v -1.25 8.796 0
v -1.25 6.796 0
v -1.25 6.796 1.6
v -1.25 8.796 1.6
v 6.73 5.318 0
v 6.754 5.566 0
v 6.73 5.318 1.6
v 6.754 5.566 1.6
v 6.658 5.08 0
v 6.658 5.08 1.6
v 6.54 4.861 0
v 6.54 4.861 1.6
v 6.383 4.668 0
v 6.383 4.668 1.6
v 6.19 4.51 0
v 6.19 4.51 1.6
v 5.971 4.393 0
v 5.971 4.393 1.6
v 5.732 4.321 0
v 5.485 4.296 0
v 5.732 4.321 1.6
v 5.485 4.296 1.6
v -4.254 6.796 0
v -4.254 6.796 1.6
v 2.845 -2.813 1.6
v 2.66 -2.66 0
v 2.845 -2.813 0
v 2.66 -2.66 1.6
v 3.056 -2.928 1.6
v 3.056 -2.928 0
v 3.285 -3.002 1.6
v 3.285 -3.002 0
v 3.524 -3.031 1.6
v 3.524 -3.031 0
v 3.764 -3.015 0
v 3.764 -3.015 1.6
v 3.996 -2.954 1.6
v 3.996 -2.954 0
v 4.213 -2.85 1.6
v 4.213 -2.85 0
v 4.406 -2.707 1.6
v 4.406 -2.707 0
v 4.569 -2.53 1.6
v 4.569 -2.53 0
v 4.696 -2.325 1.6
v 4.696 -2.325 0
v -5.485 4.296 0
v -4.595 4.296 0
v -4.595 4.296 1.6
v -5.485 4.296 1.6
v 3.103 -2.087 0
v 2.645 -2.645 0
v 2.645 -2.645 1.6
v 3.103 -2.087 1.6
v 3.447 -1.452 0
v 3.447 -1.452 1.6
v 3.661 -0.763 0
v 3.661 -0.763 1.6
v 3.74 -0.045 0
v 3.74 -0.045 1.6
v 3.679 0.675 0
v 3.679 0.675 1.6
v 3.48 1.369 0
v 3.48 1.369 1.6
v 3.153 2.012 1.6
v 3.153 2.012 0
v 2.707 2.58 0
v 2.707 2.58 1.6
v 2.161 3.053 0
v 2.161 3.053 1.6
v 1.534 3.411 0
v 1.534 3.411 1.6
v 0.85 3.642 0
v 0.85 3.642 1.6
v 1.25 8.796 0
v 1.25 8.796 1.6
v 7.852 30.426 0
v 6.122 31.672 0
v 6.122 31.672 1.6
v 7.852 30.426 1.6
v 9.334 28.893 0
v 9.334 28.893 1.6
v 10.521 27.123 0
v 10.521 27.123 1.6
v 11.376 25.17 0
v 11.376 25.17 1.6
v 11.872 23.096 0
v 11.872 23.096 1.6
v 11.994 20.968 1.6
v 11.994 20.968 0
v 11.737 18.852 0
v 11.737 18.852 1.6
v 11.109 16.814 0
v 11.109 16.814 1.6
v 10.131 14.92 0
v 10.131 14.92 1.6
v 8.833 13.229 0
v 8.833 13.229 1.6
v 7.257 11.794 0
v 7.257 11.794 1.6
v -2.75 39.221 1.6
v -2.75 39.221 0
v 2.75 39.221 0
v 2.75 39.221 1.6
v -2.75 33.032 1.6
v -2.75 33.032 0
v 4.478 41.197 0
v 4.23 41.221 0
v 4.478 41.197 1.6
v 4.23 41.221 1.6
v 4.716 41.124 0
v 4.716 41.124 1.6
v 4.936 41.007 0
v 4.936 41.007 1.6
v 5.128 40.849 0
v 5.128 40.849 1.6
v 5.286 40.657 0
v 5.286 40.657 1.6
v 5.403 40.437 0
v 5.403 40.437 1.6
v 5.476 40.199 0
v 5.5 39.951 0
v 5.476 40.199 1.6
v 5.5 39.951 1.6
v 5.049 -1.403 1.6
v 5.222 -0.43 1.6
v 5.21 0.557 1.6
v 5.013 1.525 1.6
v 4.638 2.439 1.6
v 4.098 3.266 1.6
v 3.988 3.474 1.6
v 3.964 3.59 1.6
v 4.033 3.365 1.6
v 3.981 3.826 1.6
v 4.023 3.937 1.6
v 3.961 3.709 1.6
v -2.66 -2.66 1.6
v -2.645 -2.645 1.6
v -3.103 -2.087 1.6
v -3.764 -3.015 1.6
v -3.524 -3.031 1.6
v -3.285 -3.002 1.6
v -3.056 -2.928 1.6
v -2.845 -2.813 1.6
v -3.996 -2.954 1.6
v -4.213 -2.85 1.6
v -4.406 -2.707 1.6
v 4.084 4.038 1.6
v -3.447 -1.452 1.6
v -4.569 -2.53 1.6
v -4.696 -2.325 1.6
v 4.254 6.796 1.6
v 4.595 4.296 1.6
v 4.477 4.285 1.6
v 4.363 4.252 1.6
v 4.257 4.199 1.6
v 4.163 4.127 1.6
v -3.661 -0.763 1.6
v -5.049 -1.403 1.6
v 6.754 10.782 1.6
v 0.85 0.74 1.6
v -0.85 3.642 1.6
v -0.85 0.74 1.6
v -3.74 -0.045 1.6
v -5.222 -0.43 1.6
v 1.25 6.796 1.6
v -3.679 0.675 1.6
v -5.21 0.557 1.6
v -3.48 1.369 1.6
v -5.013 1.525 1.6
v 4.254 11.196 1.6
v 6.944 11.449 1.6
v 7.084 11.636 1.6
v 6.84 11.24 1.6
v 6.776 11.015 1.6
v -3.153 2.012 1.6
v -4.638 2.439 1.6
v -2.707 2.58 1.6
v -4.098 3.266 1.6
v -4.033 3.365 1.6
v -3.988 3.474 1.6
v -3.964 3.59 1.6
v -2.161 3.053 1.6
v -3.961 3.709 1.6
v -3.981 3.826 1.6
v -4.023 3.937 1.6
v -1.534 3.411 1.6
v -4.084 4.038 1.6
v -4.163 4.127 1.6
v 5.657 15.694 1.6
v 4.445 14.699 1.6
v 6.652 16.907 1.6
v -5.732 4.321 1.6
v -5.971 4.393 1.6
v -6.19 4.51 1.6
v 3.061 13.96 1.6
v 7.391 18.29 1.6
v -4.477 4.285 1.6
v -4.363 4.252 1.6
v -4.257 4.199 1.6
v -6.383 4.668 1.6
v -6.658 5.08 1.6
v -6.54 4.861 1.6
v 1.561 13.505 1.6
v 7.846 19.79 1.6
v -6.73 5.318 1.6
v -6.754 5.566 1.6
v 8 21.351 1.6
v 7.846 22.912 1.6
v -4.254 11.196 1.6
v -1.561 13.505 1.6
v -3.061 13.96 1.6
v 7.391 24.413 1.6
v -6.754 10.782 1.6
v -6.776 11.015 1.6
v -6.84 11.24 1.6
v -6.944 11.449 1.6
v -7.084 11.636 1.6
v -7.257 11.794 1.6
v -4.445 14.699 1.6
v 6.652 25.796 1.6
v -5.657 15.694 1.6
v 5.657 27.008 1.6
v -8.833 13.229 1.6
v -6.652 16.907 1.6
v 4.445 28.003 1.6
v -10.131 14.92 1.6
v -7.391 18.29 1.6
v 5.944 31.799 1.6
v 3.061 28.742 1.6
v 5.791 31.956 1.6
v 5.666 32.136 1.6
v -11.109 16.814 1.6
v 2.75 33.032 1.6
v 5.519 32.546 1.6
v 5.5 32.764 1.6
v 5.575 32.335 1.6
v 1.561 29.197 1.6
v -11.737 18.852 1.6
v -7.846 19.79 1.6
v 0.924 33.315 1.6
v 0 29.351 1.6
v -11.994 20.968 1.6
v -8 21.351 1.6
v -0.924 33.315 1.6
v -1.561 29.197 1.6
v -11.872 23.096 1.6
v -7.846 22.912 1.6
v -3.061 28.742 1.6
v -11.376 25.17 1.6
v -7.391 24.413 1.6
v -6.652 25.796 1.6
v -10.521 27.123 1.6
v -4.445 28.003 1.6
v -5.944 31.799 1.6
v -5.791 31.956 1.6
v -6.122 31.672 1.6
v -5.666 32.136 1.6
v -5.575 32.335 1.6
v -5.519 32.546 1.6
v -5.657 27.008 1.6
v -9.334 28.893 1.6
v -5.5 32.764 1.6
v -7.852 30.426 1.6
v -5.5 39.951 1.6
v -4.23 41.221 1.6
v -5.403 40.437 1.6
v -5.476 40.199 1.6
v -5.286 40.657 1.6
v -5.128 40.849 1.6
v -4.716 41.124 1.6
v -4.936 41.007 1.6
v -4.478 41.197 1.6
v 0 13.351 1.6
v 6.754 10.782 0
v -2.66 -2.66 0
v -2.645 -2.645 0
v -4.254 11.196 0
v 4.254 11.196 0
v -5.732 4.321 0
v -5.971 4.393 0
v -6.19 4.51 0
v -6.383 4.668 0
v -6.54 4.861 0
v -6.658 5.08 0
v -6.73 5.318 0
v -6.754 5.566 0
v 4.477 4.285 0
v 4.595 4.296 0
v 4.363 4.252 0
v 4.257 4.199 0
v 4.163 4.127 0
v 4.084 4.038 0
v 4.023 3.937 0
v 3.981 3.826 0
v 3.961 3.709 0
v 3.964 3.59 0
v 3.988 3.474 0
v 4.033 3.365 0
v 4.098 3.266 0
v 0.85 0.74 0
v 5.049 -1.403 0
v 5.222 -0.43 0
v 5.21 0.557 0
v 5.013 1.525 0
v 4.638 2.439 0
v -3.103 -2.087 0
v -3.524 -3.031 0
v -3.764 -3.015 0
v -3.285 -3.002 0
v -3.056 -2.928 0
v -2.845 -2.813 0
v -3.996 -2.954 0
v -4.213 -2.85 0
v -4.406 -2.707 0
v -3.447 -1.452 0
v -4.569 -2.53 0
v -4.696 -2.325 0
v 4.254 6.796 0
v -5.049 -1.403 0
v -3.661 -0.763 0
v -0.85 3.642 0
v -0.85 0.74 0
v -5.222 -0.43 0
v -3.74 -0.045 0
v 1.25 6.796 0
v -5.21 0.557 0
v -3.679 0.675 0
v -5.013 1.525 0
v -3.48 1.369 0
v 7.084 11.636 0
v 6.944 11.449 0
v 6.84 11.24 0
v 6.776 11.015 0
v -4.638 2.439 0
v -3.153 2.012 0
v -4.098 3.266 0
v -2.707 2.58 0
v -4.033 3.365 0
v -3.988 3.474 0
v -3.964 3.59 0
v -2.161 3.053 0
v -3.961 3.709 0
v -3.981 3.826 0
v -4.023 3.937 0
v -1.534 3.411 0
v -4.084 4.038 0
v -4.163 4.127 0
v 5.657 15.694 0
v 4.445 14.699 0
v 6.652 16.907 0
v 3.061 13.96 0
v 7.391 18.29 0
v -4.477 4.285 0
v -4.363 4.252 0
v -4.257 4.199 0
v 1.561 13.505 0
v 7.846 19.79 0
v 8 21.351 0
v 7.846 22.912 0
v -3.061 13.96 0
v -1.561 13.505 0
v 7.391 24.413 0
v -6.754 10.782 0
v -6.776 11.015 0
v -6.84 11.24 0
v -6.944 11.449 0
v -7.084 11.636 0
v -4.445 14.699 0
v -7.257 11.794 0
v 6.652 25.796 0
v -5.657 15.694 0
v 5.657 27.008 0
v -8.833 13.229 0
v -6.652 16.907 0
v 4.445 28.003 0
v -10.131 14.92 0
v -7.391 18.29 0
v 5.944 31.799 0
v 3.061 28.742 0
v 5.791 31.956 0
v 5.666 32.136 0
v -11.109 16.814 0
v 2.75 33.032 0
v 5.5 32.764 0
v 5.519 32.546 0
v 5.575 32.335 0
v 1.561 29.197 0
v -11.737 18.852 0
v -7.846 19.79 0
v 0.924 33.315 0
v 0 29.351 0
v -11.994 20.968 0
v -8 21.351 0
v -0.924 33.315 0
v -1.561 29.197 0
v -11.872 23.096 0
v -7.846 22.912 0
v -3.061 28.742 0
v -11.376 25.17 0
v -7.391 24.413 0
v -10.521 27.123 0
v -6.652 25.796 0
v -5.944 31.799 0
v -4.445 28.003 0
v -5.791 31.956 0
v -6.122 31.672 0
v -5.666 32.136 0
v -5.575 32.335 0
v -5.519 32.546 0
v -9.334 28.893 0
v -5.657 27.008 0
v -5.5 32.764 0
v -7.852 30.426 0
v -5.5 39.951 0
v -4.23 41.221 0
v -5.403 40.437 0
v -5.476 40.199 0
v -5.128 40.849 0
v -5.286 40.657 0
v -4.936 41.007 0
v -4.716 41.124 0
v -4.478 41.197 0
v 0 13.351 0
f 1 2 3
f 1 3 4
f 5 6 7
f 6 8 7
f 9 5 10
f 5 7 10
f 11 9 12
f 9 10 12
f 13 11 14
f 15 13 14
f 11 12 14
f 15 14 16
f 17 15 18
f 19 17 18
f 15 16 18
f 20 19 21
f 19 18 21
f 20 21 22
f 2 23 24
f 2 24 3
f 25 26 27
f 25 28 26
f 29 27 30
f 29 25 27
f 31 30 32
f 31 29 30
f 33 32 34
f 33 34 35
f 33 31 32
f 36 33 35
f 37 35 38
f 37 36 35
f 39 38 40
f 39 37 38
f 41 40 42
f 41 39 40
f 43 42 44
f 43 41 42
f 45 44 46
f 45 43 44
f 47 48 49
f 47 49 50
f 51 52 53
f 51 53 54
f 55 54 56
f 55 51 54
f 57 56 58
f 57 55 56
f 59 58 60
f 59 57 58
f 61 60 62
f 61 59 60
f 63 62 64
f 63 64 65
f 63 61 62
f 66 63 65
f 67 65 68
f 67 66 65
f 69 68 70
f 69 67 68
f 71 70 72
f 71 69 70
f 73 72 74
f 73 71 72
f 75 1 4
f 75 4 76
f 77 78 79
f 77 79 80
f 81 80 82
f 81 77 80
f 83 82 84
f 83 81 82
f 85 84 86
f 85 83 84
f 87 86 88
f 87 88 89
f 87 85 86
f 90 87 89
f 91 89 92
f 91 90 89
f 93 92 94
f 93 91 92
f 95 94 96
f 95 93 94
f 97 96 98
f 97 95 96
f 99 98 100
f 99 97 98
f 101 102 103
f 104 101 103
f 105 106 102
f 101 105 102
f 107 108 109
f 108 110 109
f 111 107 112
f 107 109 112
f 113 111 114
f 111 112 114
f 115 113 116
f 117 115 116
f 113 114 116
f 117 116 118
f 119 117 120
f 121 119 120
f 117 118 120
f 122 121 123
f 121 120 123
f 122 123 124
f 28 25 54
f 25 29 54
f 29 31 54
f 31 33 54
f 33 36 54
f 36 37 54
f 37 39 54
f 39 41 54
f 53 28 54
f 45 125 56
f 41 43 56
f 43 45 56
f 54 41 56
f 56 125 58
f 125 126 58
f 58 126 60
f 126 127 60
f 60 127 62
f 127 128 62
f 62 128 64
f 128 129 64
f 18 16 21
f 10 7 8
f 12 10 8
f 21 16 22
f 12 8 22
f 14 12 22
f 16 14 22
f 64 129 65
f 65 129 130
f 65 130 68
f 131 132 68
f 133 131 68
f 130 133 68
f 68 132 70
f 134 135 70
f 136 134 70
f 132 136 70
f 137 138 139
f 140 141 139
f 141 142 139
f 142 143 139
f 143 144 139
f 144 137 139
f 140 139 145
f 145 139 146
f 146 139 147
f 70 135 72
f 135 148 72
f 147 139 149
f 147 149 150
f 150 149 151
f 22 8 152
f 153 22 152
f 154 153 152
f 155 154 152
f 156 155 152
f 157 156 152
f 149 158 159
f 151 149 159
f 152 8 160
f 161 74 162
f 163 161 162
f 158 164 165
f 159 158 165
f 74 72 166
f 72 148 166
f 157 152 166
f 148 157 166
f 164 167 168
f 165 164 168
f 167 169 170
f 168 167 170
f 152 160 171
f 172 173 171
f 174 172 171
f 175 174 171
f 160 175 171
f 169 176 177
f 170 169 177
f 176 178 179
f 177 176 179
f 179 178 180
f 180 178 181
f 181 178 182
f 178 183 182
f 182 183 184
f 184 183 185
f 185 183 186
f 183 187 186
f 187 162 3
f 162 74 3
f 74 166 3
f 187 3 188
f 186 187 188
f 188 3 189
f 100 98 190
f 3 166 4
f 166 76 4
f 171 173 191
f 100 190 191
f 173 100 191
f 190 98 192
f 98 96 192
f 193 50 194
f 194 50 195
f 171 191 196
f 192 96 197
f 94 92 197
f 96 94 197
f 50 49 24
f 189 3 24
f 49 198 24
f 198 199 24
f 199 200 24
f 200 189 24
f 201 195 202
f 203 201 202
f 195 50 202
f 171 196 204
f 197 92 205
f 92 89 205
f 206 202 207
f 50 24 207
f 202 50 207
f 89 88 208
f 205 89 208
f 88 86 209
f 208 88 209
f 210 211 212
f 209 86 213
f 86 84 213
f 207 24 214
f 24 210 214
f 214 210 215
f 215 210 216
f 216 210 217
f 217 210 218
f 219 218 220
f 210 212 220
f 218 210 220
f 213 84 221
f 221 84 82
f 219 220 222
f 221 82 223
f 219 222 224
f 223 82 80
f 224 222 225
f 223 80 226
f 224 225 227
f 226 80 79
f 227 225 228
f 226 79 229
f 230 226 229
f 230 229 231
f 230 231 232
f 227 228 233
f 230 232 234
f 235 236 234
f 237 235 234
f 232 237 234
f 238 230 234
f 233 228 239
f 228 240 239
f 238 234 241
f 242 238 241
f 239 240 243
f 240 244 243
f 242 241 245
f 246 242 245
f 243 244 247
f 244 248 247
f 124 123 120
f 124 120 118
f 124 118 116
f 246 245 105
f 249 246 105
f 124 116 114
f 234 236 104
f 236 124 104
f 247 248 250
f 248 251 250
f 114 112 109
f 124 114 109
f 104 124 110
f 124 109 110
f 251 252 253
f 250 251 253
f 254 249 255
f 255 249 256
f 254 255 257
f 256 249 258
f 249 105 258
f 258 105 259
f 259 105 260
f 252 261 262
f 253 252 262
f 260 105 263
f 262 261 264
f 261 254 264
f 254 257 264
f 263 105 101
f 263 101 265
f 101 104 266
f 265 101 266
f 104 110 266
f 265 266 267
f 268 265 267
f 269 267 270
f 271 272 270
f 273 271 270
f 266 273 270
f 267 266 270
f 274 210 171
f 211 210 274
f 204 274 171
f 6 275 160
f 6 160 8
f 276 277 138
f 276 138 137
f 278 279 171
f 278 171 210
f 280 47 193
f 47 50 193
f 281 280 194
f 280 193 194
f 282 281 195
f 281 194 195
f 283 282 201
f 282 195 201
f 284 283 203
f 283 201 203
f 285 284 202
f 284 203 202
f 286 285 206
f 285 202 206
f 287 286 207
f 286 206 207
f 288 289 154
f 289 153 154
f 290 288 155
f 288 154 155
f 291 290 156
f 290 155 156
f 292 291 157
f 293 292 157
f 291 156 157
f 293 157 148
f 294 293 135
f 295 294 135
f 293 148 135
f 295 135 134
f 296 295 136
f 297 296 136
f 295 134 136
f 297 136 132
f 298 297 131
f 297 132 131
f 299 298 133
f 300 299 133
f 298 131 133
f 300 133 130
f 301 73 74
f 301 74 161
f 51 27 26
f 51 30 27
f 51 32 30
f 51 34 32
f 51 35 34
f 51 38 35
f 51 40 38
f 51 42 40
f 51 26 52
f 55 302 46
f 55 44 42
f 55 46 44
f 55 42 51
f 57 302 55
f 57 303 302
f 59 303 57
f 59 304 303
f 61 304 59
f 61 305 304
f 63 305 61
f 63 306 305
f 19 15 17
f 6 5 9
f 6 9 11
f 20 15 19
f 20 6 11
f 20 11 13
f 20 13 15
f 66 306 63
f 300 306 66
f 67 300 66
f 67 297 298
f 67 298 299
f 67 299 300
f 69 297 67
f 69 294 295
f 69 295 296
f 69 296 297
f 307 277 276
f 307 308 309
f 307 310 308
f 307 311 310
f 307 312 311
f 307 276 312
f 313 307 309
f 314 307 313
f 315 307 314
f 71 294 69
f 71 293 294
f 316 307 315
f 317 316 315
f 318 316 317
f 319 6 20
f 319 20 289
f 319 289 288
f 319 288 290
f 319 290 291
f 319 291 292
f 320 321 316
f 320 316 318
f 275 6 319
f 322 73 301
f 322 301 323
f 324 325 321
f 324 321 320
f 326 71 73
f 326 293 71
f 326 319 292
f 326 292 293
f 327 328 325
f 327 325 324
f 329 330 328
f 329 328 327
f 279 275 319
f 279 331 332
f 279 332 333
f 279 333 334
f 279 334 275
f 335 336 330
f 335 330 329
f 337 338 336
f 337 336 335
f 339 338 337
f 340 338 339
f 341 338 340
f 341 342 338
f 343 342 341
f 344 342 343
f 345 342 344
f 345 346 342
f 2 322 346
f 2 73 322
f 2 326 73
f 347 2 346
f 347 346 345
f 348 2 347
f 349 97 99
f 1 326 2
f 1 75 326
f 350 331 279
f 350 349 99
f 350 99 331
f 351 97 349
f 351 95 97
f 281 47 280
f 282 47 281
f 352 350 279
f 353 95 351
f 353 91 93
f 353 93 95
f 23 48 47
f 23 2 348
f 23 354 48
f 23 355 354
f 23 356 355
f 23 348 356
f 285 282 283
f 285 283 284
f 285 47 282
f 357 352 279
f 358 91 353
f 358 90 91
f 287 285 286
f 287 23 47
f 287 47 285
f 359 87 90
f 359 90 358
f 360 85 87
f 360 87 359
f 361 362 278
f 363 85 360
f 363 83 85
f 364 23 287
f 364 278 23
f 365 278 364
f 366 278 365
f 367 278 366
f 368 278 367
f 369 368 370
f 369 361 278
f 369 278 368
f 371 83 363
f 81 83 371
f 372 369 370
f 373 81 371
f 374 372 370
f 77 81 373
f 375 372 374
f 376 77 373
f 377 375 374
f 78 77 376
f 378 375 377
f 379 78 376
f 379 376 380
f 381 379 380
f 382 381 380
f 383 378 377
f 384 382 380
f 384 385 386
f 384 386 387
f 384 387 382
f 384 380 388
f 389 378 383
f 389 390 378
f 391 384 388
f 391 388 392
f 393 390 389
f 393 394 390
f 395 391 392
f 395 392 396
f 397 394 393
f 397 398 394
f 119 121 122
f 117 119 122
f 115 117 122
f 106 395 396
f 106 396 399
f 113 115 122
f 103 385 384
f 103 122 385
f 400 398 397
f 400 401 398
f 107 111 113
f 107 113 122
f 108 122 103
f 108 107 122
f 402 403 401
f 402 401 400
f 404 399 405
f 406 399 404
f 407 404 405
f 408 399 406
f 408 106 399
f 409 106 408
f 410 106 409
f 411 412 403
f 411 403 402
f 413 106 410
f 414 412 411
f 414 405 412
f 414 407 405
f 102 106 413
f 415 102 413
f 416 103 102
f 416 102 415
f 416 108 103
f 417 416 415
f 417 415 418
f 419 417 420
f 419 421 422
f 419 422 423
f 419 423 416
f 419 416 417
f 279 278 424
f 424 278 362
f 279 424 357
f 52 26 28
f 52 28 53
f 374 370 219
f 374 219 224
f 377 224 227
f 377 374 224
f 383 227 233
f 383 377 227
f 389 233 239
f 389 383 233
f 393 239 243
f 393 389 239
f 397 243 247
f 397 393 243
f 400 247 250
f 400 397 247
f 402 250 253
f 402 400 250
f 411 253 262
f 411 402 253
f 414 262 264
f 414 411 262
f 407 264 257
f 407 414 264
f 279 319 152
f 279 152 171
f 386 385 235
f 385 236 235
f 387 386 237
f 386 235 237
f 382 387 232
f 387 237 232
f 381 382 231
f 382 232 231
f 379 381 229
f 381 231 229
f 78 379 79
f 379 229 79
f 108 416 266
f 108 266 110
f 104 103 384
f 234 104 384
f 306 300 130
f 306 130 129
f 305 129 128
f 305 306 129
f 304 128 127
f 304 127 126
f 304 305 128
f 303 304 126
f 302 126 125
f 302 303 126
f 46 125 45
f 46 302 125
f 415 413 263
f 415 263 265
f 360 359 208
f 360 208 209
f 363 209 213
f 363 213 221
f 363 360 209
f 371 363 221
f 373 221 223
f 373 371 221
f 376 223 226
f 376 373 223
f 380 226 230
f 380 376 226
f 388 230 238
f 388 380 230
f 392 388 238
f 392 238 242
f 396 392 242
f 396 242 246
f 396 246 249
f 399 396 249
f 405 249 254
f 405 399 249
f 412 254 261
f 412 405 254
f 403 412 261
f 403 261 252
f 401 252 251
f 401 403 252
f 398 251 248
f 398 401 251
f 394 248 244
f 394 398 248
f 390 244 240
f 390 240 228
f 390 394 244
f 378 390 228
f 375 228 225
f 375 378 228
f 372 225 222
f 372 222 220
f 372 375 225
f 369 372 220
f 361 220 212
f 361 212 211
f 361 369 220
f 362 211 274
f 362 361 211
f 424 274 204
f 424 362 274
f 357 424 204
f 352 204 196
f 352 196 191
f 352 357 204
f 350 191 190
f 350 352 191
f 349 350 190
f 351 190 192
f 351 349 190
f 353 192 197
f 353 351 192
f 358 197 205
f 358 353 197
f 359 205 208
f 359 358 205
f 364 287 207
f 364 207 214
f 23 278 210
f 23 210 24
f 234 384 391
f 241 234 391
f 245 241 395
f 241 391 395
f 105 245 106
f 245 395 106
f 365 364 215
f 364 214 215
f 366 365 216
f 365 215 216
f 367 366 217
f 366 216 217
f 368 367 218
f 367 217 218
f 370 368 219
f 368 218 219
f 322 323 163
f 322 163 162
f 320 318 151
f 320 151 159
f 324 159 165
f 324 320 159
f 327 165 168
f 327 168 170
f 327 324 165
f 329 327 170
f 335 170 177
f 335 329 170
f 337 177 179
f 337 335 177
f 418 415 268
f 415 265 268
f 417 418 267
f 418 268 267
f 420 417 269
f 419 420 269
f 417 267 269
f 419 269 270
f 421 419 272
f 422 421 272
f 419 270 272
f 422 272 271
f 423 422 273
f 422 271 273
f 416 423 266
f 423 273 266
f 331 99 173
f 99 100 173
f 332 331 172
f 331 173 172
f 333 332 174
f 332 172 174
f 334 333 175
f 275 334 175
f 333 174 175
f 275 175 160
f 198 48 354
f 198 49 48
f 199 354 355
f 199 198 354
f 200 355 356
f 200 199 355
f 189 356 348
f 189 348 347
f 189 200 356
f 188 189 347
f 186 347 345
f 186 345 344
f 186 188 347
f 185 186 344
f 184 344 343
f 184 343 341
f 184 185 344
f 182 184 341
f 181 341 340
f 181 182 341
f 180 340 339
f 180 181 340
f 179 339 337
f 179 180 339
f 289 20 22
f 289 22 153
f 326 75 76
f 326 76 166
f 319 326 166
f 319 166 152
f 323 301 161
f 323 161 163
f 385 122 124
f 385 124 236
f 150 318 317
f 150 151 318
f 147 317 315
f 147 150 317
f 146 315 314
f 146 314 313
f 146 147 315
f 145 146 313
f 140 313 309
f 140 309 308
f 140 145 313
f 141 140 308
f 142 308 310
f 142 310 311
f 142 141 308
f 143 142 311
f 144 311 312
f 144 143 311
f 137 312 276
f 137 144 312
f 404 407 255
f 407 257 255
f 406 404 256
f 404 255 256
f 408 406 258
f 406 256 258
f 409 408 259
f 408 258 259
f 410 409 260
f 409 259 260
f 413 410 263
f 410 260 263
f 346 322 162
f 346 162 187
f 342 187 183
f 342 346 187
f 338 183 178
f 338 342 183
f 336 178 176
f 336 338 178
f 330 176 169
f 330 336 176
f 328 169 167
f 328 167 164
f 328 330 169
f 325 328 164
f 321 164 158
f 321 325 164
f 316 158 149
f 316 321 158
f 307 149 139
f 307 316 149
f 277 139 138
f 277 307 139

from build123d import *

# Parameters (mm, degrees)
SKETCH2_R           = 8
BOSS_EXTRUDE1_DEPTH = 1.6
FILLET1_R           = 0.635
FILLET2_R           = 1.27


with BuildPart() as part:
    # Sketch2 → Boss-Extrude1 (new body)
    with BuildSketch(Plane.XY):
        with BuildLine():
            Line((-5.5, 32.016485365), (-5.5, 41.221120861))
            Line((-5.5, 41.221120861), (5.5, 41.221120861))
            Line((5.5, 41.221120861), (5.5, 32.016485365))
            ThreePointArc((5.5, 32.016485365), (11.977775563, 22.081115767), (6.7545, 11.43261645))
            Line((6.7545, 11.43261645), (6.7545, 4.296230906))
            Line((6.7545, 4.296230906), (3, 4.296230906))
            ThreePointArc((3, 4.296230906), (5.219764516, 0.460063475), (3.705239533, -3.705239533))
            Line((3.705239533, -3.705239533), (2.644579362, -2.644579362))
            ThreePointArc((2.644579362, -2.644579362), (3.596344694, 1.026598676), (0.85, 3.642128499))
            Line((0.85, 3.642128499), (0.85, 0.74))
            Line((0.85, 0.74), (-0.85, 0.74))
            Line((-0.85, 0.74), (-0.85, 3.642128499))
            ThreePointArc((-0.85, 3.642128499), (-3.596344694, 1.026598676), (-2.644579362, -2.644579362))
            Line((-2.644579362, -2.644579362), (-3.705239533, -3.705239533))
            ThreePointArc((-3.705239533, -3.705239533), (-5.219764516, 0.460063475), (-3, 4.296230906))
            Line((-3, 4.296230906), (-6.7545, 4.296230906))
            Line((-6.7545, 4.296230906), (-6.7545, 11.43261645))
            ThreePointArc((-6.7545, 11.43261645), (-11.977775563, 22.081115767), (-5.5, 32.016485365))
        make_face()
        with Locations((0, 21.351120861)):
            Circle(SKETCH2_R, mode=Mode.SUBTRACT)
        with BuildLine():
            Line((-2.75, 39.221120861), (2.75, 39.221120861))
            Line((2.75, 39.221120861), (2.75, 33.031767248))
            ThreePointArc((2.75, 33.031767248), (0, 33.351120861), (-2.75, 33.031767248))
            Line((-2.75, 33.031767248), (-2.75, 39.221120861))
        make_face(mode=Mode.SUBTRACT)
        Polygon((-1.25, 6.796230906), (-1.25, 8.796230906), (1.25, 8.796230906), (1.25, 6.796230906), (4.2545, 6.796230906), (4.2545, 11.196230906), (-4.2545, 11.196230906), (-4.2545, 6.796230906), align=None, mode=Mode.SUBTRACT)
    extrude(amount=BOSS_EXTRUDE1_DEPTH)

    # Fillet1
    fillet1_edges = [part.edges().sort_by_distance(p)[0] for p in [
        (-3, 4.296230906, 0.8),
        (3, 4.296230906, 0.8),
    ]]
    fillet(fillet1_edges, radius=FILLET1_R)

    # Fillet2
    fillet2_edges = [part.edges().sort_by_distance(p)[0] for p in [
        (-6.7545, 4.296230906, 0.8),
        (-6.7545, 11.43261645, 0.8),
        (-5.5, 32.016485365, 0.8),
        (-5.5, 41.221120861, 0.8),
        (5.5, 41.221120861, 0.8),
        (5.5, 32.016485365, 0.8),
        (6.7545, 11.43261645, 0.8),
        (6.7545, 4.296230906, 0.8),
        (3.705239533, -3.705239533, 0.8),
        (-3.705239533, -3.705239533, 0.8),
    ]]
    fillet(fillet2_edges, radius=FILLET2_R)


solid = part.part
